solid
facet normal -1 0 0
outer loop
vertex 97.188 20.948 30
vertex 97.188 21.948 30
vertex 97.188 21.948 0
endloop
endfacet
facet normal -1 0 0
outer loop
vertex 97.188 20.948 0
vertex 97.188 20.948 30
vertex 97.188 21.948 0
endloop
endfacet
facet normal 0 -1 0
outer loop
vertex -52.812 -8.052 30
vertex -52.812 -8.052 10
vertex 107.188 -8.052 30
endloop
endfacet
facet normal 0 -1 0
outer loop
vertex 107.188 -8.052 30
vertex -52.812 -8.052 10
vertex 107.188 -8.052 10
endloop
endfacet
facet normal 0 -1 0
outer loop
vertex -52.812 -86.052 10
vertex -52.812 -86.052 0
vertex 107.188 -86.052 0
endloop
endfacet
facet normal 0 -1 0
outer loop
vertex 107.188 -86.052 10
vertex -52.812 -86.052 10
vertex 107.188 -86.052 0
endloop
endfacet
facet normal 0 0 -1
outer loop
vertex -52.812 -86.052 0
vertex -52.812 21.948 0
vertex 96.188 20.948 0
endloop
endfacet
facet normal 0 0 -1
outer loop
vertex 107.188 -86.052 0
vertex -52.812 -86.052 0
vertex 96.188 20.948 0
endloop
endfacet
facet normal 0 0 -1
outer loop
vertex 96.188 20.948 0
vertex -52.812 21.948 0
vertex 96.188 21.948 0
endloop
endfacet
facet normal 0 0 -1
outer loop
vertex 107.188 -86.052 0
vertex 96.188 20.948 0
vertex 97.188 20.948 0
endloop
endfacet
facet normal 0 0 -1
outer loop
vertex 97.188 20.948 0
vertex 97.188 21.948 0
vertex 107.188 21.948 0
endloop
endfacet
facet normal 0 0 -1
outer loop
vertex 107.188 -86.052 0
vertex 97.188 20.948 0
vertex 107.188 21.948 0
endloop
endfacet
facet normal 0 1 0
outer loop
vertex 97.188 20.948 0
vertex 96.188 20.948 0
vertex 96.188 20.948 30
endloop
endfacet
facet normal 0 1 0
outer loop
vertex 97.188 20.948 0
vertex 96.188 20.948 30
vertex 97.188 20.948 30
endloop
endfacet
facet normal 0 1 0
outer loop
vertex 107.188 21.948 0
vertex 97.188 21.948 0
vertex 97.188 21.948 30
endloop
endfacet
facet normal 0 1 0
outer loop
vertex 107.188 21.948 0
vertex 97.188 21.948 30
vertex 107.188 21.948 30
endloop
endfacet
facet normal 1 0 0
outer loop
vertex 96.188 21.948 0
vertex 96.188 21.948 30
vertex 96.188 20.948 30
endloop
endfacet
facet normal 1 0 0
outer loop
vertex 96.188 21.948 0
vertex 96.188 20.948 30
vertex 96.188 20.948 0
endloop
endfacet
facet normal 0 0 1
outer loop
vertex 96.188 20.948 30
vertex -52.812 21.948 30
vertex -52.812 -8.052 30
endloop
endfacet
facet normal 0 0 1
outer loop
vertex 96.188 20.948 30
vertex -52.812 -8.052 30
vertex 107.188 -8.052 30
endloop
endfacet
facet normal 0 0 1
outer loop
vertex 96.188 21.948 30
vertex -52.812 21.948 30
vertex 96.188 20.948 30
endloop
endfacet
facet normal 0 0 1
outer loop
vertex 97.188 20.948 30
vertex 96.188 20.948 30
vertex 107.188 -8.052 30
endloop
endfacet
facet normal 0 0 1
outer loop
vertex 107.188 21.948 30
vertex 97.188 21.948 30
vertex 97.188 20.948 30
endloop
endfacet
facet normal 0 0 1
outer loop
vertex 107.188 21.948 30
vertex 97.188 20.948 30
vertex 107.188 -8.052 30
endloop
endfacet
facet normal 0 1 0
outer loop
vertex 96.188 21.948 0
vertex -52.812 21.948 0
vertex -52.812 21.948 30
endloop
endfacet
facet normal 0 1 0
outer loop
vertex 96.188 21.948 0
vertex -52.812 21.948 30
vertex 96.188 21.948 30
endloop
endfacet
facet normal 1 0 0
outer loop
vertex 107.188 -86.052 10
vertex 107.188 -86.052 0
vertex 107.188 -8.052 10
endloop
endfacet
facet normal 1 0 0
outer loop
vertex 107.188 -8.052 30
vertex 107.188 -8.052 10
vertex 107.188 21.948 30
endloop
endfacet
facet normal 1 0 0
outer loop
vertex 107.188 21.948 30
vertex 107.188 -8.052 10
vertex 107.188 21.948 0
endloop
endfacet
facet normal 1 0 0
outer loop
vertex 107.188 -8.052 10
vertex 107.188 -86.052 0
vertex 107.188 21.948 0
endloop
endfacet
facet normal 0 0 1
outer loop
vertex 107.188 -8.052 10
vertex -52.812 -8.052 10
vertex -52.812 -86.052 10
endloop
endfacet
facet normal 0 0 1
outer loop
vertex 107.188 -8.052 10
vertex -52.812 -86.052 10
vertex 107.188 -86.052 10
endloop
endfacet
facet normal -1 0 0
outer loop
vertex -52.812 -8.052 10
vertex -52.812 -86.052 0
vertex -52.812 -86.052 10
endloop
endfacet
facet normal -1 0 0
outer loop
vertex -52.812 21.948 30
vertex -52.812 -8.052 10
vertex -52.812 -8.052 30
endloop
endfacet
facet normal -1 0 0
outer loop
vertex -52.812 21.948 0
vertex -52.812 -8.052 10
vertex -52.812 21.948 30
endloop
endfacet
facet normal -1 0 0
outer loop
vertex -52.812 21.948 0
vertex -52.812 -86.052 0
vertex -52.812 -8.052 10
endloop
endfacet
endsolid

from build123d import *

# Parameters (mm, degrees)
ESQUISSE1_W             = 160
ESQUISSE1_H             = 108
BOSS_EXTRU_1_DEPTH      = 10
ESQUISSE2_W             = 160
ESQUISSE2_H             = 30
BOSS_EXTRU_2_DEPTH      = 20
ESQUISSE3_W             = 1
ESQUISSE3_H             = 30
ENL_V_MAT_EXTRU_1_DEPTH = 1


with BuildPart() as part:
    # Esquisse1 → Boss.-Extru.1 (new body)
    with BuildSketch(Plane.XY):
        with Locations((27.187647666, -32.051659751)):
            Rectangle(ESQUISSE1_W, ESQUISSE1_H)
    extrude(amount=BOSS_EXTRU_1_DEPTH)

    # Esquisse2 → Boss.-Extru.2 (add)
    with BuildSketch(Plane.XY.offset(10)):
        with Locations((27.187647666, 6.948340249)):
            Rectangle(ESQUISSE2_W, ESQUISSE2_H)
    extrude(amount=BOSS_EXTRU_2_DEPTH)

    # Esquisse3 → Enlèv. mat.-Extru.1 (cut)
    with BuildSketch(Plane(origin=(0, 21.948340249, 0), x_dir=(1, 0, 0), z_dir=(0, 1, 0))):
        with Locations((96.687647666, -15)):
            Rectangle(ESQUISSE3_W, ESQUISSE3_H)
    extrude(amount=-ENL_V_MAT_EXTRU_1_DEPTH, mode=Mode.SUBTRACT)


solid = part.part
